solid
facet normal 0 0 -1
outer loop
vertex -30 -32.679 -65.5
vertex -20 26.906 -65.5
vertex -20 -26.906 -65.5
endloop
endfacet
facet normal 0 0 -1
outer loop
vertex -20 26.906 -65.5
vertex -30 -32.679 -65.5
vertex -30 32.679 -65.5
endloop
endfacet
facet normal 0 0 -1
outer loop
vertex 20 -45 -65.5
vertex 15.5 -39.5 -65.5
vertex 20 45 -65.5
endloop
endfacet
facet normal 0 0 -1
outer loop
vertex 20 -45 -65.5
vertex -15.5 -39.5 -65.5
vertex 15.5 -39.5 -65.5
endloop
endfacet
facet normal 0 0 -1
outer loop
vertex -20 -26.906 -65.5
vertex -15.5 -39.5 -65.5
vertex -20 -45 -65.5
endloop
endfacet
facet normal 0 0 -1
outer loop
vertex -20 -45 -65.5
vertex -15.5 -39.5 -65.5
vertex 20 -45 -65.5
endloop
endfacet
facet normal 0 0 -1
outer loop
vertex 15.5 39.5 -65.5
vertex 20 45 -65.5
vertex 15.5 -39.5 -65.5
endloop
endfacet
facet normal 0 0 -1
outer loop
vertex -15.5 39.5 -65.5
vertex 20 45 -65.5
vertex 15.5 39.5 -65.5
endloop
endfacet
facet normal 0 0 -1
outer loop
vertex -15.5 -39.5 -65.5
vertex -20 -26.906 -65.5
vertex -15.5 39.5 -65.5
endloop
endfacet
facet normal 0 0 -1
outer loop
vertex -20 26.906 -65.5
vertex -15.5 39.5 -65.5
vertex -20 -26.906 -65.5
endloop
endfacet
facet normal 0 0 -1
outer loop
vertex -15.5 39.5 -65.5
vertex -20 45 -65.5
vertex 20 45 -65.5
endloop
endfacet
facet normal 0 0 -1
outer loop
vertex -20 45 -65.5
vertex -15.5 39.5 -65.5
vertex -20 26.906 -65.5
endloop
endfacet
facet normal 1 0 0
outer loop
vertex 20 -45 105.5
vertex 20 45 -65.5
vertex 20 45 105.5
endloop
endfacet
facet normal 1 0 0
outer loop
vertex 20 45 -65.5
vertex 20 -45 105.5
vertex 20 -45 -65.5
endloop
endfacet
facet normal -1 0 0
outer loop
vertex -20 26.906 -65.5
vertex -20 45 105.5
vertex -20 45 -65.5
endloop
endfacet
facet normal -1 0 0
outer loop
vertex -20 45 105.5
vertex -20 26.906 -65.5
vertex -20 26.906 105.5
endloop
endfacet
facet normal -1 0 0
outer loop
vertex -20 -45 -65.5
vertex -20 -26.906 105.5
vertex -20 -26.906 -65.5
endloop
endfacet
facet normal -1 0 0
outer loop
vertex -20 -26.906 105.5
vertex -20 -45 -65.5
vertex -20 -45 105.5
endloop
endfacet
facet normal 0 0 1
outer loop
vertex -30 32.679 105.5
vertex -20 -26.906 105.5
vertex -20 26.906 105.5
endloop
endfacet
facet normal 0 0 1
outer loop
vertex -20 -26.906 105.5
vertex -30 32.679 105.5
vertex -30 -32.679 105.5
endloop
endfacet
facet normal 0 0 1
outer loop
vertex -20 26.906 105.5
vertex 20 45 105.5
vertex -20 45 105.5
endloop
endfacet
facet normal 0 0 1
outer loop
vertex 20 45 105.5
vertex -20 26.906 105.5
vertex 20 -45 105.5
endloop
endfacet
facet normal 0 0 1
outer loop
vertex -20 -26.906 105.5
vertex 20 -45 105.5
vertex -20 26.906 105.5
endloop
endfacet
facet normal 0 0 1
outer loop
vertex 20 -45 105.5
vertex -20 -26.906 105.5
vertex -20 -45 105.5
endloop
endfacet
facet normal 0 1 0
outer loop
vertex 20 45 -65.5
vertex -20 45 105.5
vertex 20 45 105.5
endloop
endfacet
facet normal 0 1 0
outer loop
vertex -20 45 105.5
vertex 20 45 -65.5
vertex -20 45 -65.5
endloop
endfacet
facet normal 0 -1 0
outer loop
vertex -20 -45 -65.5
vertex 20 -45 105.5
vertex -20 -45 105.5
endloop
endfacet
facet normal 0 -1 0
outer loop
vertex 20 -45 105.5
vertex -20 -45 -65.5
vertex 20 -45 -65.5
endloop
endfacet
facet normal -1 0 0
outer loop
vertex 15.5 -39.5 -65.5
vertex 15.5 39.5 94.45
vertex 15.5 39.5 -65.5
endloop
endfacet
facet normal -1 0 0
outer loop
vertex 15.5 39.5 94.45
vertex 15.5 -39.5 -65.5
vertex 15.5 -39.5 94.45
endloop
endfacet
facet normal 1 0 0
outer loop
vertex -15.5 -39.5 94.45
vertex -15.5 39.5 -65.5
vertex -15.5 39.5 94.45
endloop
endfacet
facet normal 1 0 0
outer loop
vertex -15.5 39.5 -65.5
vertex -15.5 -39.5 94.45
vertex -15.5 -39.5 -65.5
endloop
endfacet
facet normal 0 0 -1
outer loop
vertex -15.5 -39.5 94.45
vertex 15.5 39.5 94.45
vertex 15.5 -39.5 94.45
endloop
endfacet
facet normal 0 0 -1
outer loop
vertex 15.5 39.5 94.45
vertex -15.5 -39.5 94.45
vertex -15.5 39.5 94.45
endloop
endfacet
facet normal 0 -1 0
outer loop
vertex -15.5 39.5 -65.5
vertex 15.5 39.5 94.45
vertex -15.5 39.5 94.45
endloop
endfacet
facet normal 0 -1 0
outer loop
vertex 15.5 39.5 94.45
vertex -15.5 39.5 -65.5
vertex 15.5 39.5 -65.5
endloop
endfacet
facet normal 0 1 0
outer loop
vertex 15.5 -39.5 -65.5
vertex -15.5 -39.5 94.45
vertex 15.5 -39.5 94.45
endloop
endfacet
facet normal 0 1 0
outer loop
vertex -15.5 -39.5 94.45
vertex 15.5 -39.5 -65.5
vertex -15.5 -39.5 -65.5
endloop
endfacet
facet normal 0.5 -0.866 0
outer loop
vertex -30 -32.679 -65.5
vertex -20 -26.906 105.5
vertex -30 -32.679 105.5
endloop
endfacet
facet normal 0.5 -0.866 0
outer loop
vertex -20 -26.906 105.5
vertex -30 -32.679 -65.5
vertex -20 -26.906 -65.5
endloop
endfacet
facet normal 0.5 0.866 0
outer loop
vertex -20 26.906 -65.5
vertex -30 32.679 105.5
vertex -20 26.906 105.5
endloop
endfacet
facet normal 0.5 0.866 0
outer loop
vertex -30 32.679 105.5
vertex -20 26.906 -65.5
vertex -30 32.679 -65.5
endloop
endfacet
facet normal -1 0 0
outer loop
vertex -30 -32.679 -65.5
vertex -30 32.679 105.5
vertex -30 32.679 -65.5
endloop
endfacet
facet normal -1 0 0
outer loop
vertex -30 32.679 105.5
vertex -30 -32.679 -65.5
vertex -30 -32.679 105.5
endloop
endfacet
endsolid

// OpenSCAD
$fn = 6;
module 3sliposlide(){

    translate([0, 0, 20]){
        rotate([0, 90, 0]){
            difference(){
                cube([171, 90, 40], center = true);
                translate([5.55, 0, 0]){
                    cube([160, 79, 31], center = true);
                }
            }    
        }
    }
    translate([-60,0,20]){
        rotate([0, 180, 0]){
            slide(171);
        }
    }

}
module slide(height){
    rotate([0, 0, -30]){
        difference(){
            cylinder(height, d = 100, center= true);
            
                rotate([0,0, 30]){
                    translate([20, 0, 0]){
                        cube([100, 100, height+1], center = true);                    
                    }
    
                }
    
        }
    }
}

3sliposlide();
